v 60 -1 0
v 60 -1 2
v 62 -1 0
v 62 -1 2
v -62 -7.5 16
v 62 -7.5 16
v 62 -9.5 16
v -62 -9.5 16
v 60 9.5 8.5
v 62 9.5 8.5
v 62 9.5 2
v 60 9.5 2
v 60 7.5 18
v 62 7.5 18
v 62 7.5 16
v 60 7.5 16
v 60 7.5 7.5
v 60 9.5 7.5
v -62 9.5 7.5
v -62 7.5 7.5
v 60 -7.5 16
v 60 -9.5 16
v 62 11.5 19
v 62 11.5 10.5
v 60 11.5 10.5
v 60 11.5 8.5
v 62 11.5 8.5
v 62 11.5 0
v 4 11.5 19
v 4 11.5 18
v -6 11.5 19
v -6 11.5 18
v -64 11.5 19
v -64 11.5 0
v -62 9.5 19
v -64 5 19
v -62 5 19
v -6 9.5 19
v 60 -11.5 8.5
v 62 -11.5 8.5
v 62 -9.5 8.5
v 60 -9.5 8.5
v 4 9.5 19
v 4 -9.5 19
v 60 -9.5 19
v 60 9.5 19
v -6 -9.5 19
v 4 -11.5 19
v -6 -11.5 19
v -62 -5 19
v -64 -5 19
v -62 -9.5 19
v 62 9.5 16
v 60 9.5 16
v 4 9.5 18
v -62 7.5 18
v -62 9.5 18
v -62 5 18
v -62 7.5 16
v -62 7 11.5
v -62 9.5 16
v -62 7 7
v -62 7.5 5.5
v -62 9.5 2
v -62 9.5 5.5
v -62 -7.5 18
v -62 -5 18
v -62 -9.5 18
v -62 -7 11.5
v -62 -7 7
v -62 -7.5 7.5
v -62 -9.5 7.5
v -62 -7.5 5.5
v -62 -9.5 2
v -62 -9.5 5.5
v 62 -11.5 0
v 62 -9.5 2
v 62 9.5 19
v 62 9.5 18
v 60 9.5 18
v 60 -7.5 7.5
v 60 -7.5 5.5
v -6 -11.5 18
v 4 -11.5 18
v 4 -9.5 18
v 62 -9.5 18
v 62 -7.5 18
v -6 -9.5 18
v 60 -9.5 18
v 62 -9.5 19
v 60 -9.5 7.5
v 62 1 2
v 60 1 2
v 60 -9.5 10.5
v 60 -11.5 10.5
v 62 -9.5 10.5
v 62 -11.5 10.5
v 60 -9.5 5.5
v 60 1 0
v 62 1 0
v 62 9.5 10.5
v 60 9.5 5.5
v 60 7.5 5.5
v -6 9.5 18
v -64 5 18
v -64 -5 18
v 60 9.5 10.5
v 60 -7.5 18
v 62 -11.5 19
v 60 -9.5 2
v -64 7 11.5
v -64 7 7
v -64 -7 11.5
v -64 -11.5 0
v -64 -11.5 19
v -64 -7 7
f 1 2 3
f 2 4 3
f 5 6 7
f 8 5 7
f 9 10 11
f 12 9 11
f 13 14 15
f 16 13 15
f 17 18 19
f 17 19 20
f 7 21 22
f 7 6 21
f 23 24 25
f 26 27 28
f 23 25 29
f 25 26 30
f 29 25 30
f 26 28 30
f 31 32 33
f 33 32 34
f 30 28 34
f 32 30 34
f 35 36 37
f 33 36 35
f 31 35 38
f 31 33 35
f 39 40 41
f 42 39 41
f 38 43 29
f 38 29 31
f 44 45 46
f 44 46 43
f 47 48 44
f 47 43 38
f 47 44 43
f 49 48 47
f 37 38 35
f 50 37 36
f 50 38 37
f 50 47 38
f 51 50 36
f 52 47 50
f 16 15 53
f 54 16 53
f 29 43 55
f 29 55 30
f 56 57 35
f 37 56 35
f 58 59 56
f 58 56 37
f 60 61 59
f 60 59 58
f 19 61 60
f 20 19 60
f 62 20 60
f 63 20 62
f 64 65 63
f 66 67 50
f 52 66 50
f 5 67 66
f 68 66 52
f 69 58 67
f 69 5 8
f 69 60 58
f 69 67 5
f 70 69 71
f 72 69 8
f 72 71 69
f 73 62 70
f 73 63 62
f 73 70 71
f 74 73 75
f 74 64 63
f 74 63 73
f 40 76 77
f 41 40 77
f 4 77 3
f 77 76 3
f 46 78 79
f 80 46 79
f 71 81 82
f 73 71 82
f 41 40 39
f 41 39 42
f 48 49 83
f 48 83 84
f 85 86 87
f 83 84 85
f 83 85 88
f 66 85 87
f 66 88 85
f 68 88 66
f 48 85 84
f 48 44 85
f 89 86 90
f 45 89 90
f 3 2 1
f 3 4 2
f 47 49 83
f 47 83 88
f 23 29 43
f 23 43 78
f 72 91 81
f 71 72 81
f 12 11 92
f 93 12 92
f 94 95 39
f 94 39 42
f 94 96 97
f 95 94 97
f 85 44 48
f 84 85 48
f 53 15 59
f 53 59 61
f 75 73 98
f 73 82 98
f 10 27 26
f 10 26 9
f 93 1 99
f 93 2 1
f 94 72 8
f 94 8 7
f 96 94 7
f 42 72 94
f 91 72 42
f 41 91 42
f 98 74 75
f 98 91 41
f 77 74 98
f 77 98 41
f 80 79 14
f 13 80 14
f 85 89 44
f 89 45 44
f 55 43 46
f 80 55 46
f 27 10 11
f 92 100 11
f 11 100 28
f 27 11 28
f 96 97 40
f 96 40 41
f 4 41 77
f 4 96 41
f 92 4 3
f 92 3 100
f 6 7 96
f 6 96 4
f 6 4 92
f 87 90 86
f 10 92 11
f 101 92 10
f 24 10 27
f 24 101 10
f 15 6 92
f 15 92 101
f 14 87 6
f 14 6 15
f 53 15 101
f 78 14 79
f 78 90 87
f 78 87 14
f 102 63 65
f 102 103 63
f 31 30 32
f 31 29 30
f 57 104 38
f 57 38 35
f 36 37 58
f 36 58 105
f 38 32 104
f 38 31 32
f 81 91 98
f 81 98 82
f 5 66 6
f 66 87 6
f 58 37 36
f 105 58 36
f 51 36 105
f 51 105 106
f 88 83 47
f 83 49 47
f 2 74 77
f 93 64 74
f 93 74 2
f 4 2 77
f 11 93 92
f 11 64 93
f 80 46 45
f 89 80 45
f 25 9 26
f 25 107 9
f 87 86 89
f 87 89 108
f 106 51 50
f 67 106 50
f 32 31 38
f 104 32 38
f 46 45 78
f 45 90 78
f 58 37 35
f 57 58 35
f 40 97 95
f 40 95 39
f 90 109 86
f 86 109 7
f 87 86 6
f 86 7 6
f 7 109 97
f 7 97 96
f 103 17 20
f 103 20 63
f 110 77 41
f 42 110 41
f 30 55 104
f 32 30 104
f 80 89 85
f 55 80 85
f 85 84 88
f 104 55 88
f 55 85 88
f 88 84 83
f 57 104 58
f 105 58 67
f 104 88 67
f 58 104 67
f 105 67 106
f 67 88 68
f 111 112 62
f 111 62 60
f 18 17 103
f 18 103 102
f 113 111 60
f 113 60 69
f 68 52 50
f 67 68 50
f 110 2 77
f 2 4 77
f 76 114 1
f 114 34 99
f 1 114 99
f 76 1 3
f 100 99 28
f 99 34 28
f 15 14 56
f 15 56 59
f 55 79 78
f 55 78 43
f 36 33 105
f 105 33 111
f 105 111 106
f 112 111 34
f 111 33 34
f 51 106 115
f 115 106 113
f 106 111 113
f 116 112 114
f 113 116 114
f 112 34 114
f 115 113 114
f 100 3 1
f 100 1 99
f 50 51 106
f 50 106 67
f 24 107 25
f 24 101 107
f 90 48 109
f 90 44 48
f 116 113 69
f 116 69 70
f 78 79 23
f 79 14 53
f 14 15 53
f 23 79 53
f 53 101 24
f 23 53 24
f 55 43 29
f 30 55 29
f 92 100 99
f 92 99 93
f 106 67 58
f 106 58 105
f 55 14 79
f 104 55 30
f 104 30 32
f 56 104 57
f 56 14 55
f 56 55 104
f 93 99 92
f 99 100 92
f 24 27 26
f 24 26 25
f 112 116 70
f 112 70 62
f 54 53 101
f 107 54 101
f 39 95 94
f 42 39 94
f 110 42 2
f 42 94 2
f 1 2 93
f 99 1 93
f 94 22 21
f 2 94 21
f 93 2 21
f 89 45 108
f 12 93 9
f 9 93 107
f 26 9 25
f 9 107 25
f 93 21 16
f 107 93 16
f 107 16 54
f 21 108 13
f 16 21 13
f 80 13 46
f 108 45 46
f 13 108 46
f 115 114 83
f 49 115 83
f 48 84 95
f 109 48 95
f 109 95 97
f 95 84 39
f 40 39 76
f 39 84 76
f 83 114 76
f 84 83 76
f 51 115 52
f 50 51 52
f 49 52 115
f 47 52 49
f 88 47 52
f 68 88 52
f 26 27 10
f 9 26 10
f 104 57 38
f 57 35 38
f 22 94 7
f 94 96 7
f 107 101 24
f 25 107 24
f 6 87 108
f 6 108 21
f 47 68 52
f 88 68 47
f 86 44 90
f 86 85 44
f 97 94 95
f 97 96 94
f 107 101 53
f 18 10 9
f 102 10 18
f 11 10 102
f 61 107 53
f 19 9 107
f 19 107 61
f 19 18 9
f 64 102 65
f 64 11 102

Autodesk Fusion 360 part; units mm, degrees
sketch "Boceto1" plane through (0, 0, 0) normal (0, 0, 1) x (1, 0, 0)
  line L0 (60, 8.75) -> (-60, 8.75)
  line L1 (-60, 8.75) -> (-60, -8.75)
  line L2 (-60, -8.75) -> (60, -8.75)
  line L3 (60, -8.75) -> (60, 8.75)
  line L4 (60, 8.75) -> (-60, -8.75) construction
  line L5 (-60, 8.75) -> (60, -8.75) construction
  dimension "d1" = 120
  dimension "d2" = 17.5
sketch "Boceto2" plane through (0, 0, 0) normal (0, 0, 1) x (1, 0, 0)
  line L0 (62, 9.5) -> (-62, 9.5)
  line L1 (-62, 9.5) -> (-62, -9.5)
  line L2 (-62, -9.5) -> (62, -9.5)
  line L3 (62, -9.5) -> (62, 9.5)
  line L4 (62, 9.5) -> (-62, -9.5) construction
  line L5 (-62, 9.5) -> (62, -9.5) construction
  line L6 (64, 11.5) -> (-64, 11.5)
  line L7 (-64, 11.5) -> (-64, -11.5)
  line L8 (-64, -11.5) -> (64, -11.5)
  line L9 (64, -11.5) -> (64, 11.5)
  line L10 (64, 11.5) -> (-64, -11.5) construction
  line L11 (-64, 11.5) -> (64, -11.5) construction
  dimension "d3" = 124
  dimension "d4" = 19
  dimension "d5" = 128
  dimension "d6" = 23
extrude "Extruir1" add sketch "Boceto2" along normal blind 2 contours L0 L1 L2 L3 makes body 1
extrude "Extruir2" add sketch "Boceto2" along normal blind 19 bodies 1
extrude "Extruir3" cut 1 faces at (64, -3.8333, 12.6667) along direction (-1, 0, 0) blind 2 on bodies 1 bodies 1
sketch "Boceto3" plane through (62, 0, 0) normal (1, 0, 0) x (0, 1, 0)
  line L0 (9.5, 19) -> (9.5, 2)
  line L1 (9.5, 2) -> (-9.5, 2)
  line L2 (-9.5, 2) -> (-9.5, 19)
  line L3 (-9.5, 19) -> (-11.5, 19)
  line L4 (-11.5, 19) -> (-11.5, 0)
  line L5 (-11.5, 0) -> (11.5, 0)
  line L6 (11.5, 0) -> (11.5, 19)
  line L7 (11.5, 19) -> (9.5, 19)
  line L8 (-11.5, 19) -> (11.5, 19)
  line L9 (11.5, 19) -> (11.5, 0)
  line L10 (11.5, 0) -> (-11.5, 0)
  line L11 (-11.5, 0) -> (-11.5, 19)
  line L12 (-11.5, 19) -> (-9.5, 19)
  line L13 (-9.5, 2) -> (9.5, 2)
  line L14 (9.5, 19) -> (11.5, 19)
  line L15 (-9.5, 19) -> (-9.5, 2)
  line L16 (9.5, 2) -> (9.5, 19)
  line L17 (-9.5, 7.5) -> (-7.5, 7.5)
  line L18 (-7.5, 7.5) -> (-7.5, 5.5)
  line L19 (-7.5, 5.5) -> (-9.5, 5.5)
  line L20 (-9.5, 5.5) -> (-9.5, 7.5)
  line L21 (0, 19) -> (0, 0) construction
  line L22 (-9.5, 18) -> (-7.5, 18)
  line L23 (-7.5, 18) -> (-7.5, 16)
  line L24 (-7.5, 16) -> (-9.5, 16)
  line L25 (-9.5, 16) -> (-9.5, 18)
  line L26 (9.5, 18) -> (7.5, 18)
  line L27 (7.5, 18) -> (7.5, 16)
  line L28 (7.5, 16) -> (9.5, 16)
  line L29 (9.5, 7.5) -> (7.5, 7.5)
  line L30 (7.5, 7.5) -> (7.5, 5.5)
  line L31 (7.5, 5.5) -> (9.5, 5.5)
  line L32 (-11.5, 9.5) -> (11.5, 9.5) construction
  line L33 (-9.5, 10.5) -> (-11.5, 10.5)
  line L34 (-11.5, 10.5) -> (-11.5, 8.5)
  line L35 (-11.5, 8.5) -> (-9.5, 8.5)
  line L36 (-9.5, 8.5) -> (-9.5, 10.5)
  line L37 (-9.5, 10.5) -> (-11.5, 8.5) construction
  line L38 (-11.5, 10.5) -> (-9.5, 8.5) construction
  line L39 (9.5, 10.5) -> (11.5, 10.5)
  line L40 (11.5, 10.5) -> (11.5, 8.5)
  line L41 (11.5, 8.5) -> (9.5, 8.5)
  line L42 (9.5, 8.5) -> (9.5, 10.5)
  line L43 (1, 2) -> (-1, 2)
  line L44 (-1, 2) -> (-1, 0)
  line L45 (-1, 0) -> (1, 0)
  line L46 (1, 0) -> (1, 2)
  line L47 (1, 2) -> (-1, 0) construction
  line L48 (-1, 2) -> (1, 0) construction
  point P0 (-10.5, 9.5)
  point P1 (0, 1)
  dimension "d13" = 2
  dimension "d14" = 2
  dimension "d15" = 3.5
  dimension "d16" = 2
  dimension "d17" = 2
  dimension "d18" = 1
  dimension "d30" = 2
  dimension "d31" = 2
  dimension "d32" = 2
  dimension "d33" = 2
extrude "Extruir4" add sketch "Boceto3" against normal blind 125 contours L0 L16 L26 L27 L28 | L2 L15 L22 L23 L24 L25 | L0 L16 L29 L30 L31 | L2 L15 L17 L18 L19 L20 bodies 1
sketch "Boceto4" plane through (-64, 0, 0) normal (-1, 0, 0) x (0, -1, 0)
  line L0 (-11.5, 0) -> (11.5, 0)
  line L1 (11.5, 0) -> (11.5, 19)
  line L2 (11.5, 19) -> (-11.5, 19)
  line L3 (-11.5, 19) -> (-11.5, 0)
  line L4 (-11.5, 19) -> (11.5, 19)
  line L5 (11.5, 19) -> (11.5, 0)
  line L6 (11.5, 0) -> (-11.5, 0)
  line L7 (-11.5, 0) -> (-11.5, 19)
  line L8 (-11.5, 19) -> (-9.5, 19)
  line L9 (-9.5, 19) -> (-9.5, 2)
  line L10 (-9.5, 0) -> (-11.5, 0)
  line L11 (-11.5, 0) -> (-11.5, 19)
  line L12 (-11.5, 0) -> (11.5, 0)
  line L13 (11.5, 0) -> (11.5, 2)
  line L14 (9.5, 2) -> (-9.5, 2)
  line L15 (-11.5, 2) -> (-11.5, 0)
  line L16 (11.5, 19) -> (9.5, 19)
  line L17 (9.5, 19) -> (9.5, 2)
  line L18 (9.5, 0) -> (11.5, 0)
  line L19 (11.5, 0) -> (11.5, 19)
  line L20 (-7, 11.5) -> (7, 11.5)
  line L21 (7, 11.5) -> (7, 7)
  line L22 (7, 7) -> (-7, 7)
  line L23 (-7, 7) -> (-7, 11.5)
  dimension "d21" = 2
  dimension "d22" = 2
  dimension "d23" = 2
  dimension "d24" = 14
  dimension "d25" = 4.5
  dimension "d26" = 2.5
  dimension "d27" = 5
extrude "Extruir5" cut sketch "Boceto4" against normal blind 2 contours L20 L21 L22 L23 bodies 1
extrude "Extruir6" cut sketch "Boceto3" against normal blind 2 contours L0 L6 L9 L16 L39 L40 L41 L42 | L2 L4 L11 L15 L33 L34 L35 L36 | L0 L16 L29 L30 L31 | L1 L5 L10 L13 L43 L44 L45 L46 | L2 L15 L17 L18 L19 L20 bodies 1
sketch "Boceto5" plane through (0, 0, 19) normal (0, 0, 1) x (-1, 0, 0)
  line L0 (-62, -9.5) -> (-62, -11.5)
  line L1 (-62, -11.5) -> (64, -11.5)
  line L2 (64, -11.5) -> (64, 11.5)
  line L3 (64, 11.5) -> (-62, 11.5)
  line L4 (-62, 11.5) -> (-62, 9.5)
  line L5 (-62, 9.5) -> (62, 9.5)
  line L6 (62, 9.5) -> (62, -9.5)
  line L7 (62, -9.5) -> (-62, -9.5)
  line L8 (-62, 0) -> (64, 0) construction
  line L9 (1, 11.5) -> (1, -11.5) construction
  line L10 (6, 9.5) -> (-4, 9.5)
  line L11 (-4, 9.5) -> (-4, 11.5)
  line L12 (-4, 11.5) -> (6, 11.5)
  line L13 (6, 11.5) -> (6, 9.5)
  line L14 (6, 9.5) -> (-4, 11.5) construction
  line L15 (-4, 9.5) -> (6, 11.5) construction
  line L16 (-4, -9.5) -> (-4, -11.5)
  line L17 (-4, -11.5) -> (6, -11.5)
  line L18 (6, -11.5) -> (6, -9.5)
  line L19 (6, -9.5) -> (-4, -9.5)
  line L20 (64, 5) -> (62, 5)
  line L21 (62, 5) -> (62, -5)
  line L22 (62, -5) -> (64, -5)
  line L23 (64, -5) -> (64, 5)
  line L24 (64, 5) -> (62, -5) construction
  line L25 (62, 5) -> (64, -5) construction
  line L26 (62, -9.5) -> (-60, -9.5)
  line L27 (-60, -9.5) -> (-60, 9.5)
  line L28 (-60, 9.5) -> (62, 9.5)
  line L29 (62, 9.5) -> (62, -9.5)
  line L30 (-62, 9.5) -> (-62, 1)
  point P0 (1, 10.5)
  point P1 (63, 0)
  dimension "d36" = 10
  dimension "d37" = 2
  dimension "d38" = 2
  dimension "d39" = 10
  dimension "d44" = 2
extrude "Extruir7" cut sketch "Boceto5" against normal blind 1 contours L1 L7 L16 L17 L18 L19 L26 | L3 L5 L10 L11 L12 L13 L28 | L2 L6 L20 L21 L22 L23 L29 bodies 1
extrude "Extruir8" add sketch "Boceto3" against normal blind 2 separate body contours L0 L1 L2 L8 L13 L15 L16 L17 L18 L19 L22 L23 L24 L26 L27 L28 L29 L30 L31 L36 L42 L43 | L0 L6 L9 L16 L39 L40 L41 L42 | L2 L4 L11 L15 L33 L34 L35 L36 | L0 L16 L29 L30 L31 | L1 L5 L10 L13 L43 L44 L45 L46 | L2 L15 L17 L18 L19 L20 makes body 2
extrude "Extruir9" add sketch "Boceto5" against normal blind 1 separate body contours L5 L6 L7 L10 L19 L21 L26 L27 L28 L29 | L1 L7 L16 L17 L18 L19 L26 | L3 L5 L10 L11 L12 L13 L28 | L2 L6 L20 L21 L22 L23 L29 makes body 3
